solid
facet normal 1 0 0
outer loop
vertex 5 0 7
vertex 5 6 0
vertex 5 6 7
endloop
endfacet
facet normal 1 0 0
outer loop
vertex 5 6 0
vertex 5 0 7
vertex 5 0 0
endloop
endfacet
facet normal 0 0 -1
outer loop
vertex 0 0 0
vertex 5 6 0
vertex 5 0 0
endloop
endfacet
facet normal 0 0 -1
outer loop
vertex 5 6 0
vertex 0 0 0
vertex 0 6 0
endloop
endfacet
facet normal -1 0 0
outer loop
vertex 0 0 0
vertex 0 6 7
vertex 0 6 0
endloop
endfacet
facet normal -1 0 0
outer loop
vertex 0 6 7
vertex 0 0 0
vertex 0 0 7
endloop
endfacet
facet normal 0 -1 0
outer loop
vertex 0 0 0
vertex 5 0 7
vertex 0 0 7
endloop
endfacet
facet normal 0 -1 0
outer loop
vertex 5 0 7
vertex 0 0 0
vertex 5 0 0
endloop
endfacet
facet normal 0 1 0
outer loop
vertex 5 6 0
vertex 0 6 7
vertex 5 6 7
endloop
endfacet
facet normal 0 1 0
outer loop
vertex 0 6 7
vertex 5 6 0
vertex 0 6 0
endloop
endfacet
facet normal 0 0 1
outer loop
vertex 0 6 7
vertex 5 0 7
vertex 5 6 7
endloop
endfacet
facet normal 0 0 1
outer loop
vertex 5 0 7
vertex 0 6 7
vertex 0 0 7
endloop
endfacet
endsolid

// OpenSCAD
translate([2.5, 1.0, 1.5]) color([0.7676407428212785, 0.43171649556411207, 0.2479576688970051]) cube([5, 2, 3], center=true);
translate([2.5, 3.0, 1.5]) color([0.4534470315306477, 0.9371046462904561, 0.14256748821860132]) cube([5, 2, 3], center=true);
translate([2.5, 5.0, 1.5]) color([0.4624353545272121, 0.6373035243637815, 0.48328798826810027]) cube([5, 2, 3], center=true);
translate([2.5, 1.5, 4.0]) color([0.20363990437036994, 0.0018431606156659175, 0.698991711803439]) cube([5, 3, 2], center=true);
translate([2.5, 4.5, 4.0]) color([0.6187355180234525, 0.007776649435864202, 0.2985601210181208]) cube([5, 3, 2], center=true);
translate([2.5, 1.5, 6.0]) color([0.7686342595428415, 0.6289203785446209, 0.5452081159439722]) cube([5, 3, 2], center=true);
translate([2.5, 4.5, 6.0]) color([0.1562211098090489, 0.7062940429996885, 0.4714349217158037]) cube([5, 3, 2], center=true);
